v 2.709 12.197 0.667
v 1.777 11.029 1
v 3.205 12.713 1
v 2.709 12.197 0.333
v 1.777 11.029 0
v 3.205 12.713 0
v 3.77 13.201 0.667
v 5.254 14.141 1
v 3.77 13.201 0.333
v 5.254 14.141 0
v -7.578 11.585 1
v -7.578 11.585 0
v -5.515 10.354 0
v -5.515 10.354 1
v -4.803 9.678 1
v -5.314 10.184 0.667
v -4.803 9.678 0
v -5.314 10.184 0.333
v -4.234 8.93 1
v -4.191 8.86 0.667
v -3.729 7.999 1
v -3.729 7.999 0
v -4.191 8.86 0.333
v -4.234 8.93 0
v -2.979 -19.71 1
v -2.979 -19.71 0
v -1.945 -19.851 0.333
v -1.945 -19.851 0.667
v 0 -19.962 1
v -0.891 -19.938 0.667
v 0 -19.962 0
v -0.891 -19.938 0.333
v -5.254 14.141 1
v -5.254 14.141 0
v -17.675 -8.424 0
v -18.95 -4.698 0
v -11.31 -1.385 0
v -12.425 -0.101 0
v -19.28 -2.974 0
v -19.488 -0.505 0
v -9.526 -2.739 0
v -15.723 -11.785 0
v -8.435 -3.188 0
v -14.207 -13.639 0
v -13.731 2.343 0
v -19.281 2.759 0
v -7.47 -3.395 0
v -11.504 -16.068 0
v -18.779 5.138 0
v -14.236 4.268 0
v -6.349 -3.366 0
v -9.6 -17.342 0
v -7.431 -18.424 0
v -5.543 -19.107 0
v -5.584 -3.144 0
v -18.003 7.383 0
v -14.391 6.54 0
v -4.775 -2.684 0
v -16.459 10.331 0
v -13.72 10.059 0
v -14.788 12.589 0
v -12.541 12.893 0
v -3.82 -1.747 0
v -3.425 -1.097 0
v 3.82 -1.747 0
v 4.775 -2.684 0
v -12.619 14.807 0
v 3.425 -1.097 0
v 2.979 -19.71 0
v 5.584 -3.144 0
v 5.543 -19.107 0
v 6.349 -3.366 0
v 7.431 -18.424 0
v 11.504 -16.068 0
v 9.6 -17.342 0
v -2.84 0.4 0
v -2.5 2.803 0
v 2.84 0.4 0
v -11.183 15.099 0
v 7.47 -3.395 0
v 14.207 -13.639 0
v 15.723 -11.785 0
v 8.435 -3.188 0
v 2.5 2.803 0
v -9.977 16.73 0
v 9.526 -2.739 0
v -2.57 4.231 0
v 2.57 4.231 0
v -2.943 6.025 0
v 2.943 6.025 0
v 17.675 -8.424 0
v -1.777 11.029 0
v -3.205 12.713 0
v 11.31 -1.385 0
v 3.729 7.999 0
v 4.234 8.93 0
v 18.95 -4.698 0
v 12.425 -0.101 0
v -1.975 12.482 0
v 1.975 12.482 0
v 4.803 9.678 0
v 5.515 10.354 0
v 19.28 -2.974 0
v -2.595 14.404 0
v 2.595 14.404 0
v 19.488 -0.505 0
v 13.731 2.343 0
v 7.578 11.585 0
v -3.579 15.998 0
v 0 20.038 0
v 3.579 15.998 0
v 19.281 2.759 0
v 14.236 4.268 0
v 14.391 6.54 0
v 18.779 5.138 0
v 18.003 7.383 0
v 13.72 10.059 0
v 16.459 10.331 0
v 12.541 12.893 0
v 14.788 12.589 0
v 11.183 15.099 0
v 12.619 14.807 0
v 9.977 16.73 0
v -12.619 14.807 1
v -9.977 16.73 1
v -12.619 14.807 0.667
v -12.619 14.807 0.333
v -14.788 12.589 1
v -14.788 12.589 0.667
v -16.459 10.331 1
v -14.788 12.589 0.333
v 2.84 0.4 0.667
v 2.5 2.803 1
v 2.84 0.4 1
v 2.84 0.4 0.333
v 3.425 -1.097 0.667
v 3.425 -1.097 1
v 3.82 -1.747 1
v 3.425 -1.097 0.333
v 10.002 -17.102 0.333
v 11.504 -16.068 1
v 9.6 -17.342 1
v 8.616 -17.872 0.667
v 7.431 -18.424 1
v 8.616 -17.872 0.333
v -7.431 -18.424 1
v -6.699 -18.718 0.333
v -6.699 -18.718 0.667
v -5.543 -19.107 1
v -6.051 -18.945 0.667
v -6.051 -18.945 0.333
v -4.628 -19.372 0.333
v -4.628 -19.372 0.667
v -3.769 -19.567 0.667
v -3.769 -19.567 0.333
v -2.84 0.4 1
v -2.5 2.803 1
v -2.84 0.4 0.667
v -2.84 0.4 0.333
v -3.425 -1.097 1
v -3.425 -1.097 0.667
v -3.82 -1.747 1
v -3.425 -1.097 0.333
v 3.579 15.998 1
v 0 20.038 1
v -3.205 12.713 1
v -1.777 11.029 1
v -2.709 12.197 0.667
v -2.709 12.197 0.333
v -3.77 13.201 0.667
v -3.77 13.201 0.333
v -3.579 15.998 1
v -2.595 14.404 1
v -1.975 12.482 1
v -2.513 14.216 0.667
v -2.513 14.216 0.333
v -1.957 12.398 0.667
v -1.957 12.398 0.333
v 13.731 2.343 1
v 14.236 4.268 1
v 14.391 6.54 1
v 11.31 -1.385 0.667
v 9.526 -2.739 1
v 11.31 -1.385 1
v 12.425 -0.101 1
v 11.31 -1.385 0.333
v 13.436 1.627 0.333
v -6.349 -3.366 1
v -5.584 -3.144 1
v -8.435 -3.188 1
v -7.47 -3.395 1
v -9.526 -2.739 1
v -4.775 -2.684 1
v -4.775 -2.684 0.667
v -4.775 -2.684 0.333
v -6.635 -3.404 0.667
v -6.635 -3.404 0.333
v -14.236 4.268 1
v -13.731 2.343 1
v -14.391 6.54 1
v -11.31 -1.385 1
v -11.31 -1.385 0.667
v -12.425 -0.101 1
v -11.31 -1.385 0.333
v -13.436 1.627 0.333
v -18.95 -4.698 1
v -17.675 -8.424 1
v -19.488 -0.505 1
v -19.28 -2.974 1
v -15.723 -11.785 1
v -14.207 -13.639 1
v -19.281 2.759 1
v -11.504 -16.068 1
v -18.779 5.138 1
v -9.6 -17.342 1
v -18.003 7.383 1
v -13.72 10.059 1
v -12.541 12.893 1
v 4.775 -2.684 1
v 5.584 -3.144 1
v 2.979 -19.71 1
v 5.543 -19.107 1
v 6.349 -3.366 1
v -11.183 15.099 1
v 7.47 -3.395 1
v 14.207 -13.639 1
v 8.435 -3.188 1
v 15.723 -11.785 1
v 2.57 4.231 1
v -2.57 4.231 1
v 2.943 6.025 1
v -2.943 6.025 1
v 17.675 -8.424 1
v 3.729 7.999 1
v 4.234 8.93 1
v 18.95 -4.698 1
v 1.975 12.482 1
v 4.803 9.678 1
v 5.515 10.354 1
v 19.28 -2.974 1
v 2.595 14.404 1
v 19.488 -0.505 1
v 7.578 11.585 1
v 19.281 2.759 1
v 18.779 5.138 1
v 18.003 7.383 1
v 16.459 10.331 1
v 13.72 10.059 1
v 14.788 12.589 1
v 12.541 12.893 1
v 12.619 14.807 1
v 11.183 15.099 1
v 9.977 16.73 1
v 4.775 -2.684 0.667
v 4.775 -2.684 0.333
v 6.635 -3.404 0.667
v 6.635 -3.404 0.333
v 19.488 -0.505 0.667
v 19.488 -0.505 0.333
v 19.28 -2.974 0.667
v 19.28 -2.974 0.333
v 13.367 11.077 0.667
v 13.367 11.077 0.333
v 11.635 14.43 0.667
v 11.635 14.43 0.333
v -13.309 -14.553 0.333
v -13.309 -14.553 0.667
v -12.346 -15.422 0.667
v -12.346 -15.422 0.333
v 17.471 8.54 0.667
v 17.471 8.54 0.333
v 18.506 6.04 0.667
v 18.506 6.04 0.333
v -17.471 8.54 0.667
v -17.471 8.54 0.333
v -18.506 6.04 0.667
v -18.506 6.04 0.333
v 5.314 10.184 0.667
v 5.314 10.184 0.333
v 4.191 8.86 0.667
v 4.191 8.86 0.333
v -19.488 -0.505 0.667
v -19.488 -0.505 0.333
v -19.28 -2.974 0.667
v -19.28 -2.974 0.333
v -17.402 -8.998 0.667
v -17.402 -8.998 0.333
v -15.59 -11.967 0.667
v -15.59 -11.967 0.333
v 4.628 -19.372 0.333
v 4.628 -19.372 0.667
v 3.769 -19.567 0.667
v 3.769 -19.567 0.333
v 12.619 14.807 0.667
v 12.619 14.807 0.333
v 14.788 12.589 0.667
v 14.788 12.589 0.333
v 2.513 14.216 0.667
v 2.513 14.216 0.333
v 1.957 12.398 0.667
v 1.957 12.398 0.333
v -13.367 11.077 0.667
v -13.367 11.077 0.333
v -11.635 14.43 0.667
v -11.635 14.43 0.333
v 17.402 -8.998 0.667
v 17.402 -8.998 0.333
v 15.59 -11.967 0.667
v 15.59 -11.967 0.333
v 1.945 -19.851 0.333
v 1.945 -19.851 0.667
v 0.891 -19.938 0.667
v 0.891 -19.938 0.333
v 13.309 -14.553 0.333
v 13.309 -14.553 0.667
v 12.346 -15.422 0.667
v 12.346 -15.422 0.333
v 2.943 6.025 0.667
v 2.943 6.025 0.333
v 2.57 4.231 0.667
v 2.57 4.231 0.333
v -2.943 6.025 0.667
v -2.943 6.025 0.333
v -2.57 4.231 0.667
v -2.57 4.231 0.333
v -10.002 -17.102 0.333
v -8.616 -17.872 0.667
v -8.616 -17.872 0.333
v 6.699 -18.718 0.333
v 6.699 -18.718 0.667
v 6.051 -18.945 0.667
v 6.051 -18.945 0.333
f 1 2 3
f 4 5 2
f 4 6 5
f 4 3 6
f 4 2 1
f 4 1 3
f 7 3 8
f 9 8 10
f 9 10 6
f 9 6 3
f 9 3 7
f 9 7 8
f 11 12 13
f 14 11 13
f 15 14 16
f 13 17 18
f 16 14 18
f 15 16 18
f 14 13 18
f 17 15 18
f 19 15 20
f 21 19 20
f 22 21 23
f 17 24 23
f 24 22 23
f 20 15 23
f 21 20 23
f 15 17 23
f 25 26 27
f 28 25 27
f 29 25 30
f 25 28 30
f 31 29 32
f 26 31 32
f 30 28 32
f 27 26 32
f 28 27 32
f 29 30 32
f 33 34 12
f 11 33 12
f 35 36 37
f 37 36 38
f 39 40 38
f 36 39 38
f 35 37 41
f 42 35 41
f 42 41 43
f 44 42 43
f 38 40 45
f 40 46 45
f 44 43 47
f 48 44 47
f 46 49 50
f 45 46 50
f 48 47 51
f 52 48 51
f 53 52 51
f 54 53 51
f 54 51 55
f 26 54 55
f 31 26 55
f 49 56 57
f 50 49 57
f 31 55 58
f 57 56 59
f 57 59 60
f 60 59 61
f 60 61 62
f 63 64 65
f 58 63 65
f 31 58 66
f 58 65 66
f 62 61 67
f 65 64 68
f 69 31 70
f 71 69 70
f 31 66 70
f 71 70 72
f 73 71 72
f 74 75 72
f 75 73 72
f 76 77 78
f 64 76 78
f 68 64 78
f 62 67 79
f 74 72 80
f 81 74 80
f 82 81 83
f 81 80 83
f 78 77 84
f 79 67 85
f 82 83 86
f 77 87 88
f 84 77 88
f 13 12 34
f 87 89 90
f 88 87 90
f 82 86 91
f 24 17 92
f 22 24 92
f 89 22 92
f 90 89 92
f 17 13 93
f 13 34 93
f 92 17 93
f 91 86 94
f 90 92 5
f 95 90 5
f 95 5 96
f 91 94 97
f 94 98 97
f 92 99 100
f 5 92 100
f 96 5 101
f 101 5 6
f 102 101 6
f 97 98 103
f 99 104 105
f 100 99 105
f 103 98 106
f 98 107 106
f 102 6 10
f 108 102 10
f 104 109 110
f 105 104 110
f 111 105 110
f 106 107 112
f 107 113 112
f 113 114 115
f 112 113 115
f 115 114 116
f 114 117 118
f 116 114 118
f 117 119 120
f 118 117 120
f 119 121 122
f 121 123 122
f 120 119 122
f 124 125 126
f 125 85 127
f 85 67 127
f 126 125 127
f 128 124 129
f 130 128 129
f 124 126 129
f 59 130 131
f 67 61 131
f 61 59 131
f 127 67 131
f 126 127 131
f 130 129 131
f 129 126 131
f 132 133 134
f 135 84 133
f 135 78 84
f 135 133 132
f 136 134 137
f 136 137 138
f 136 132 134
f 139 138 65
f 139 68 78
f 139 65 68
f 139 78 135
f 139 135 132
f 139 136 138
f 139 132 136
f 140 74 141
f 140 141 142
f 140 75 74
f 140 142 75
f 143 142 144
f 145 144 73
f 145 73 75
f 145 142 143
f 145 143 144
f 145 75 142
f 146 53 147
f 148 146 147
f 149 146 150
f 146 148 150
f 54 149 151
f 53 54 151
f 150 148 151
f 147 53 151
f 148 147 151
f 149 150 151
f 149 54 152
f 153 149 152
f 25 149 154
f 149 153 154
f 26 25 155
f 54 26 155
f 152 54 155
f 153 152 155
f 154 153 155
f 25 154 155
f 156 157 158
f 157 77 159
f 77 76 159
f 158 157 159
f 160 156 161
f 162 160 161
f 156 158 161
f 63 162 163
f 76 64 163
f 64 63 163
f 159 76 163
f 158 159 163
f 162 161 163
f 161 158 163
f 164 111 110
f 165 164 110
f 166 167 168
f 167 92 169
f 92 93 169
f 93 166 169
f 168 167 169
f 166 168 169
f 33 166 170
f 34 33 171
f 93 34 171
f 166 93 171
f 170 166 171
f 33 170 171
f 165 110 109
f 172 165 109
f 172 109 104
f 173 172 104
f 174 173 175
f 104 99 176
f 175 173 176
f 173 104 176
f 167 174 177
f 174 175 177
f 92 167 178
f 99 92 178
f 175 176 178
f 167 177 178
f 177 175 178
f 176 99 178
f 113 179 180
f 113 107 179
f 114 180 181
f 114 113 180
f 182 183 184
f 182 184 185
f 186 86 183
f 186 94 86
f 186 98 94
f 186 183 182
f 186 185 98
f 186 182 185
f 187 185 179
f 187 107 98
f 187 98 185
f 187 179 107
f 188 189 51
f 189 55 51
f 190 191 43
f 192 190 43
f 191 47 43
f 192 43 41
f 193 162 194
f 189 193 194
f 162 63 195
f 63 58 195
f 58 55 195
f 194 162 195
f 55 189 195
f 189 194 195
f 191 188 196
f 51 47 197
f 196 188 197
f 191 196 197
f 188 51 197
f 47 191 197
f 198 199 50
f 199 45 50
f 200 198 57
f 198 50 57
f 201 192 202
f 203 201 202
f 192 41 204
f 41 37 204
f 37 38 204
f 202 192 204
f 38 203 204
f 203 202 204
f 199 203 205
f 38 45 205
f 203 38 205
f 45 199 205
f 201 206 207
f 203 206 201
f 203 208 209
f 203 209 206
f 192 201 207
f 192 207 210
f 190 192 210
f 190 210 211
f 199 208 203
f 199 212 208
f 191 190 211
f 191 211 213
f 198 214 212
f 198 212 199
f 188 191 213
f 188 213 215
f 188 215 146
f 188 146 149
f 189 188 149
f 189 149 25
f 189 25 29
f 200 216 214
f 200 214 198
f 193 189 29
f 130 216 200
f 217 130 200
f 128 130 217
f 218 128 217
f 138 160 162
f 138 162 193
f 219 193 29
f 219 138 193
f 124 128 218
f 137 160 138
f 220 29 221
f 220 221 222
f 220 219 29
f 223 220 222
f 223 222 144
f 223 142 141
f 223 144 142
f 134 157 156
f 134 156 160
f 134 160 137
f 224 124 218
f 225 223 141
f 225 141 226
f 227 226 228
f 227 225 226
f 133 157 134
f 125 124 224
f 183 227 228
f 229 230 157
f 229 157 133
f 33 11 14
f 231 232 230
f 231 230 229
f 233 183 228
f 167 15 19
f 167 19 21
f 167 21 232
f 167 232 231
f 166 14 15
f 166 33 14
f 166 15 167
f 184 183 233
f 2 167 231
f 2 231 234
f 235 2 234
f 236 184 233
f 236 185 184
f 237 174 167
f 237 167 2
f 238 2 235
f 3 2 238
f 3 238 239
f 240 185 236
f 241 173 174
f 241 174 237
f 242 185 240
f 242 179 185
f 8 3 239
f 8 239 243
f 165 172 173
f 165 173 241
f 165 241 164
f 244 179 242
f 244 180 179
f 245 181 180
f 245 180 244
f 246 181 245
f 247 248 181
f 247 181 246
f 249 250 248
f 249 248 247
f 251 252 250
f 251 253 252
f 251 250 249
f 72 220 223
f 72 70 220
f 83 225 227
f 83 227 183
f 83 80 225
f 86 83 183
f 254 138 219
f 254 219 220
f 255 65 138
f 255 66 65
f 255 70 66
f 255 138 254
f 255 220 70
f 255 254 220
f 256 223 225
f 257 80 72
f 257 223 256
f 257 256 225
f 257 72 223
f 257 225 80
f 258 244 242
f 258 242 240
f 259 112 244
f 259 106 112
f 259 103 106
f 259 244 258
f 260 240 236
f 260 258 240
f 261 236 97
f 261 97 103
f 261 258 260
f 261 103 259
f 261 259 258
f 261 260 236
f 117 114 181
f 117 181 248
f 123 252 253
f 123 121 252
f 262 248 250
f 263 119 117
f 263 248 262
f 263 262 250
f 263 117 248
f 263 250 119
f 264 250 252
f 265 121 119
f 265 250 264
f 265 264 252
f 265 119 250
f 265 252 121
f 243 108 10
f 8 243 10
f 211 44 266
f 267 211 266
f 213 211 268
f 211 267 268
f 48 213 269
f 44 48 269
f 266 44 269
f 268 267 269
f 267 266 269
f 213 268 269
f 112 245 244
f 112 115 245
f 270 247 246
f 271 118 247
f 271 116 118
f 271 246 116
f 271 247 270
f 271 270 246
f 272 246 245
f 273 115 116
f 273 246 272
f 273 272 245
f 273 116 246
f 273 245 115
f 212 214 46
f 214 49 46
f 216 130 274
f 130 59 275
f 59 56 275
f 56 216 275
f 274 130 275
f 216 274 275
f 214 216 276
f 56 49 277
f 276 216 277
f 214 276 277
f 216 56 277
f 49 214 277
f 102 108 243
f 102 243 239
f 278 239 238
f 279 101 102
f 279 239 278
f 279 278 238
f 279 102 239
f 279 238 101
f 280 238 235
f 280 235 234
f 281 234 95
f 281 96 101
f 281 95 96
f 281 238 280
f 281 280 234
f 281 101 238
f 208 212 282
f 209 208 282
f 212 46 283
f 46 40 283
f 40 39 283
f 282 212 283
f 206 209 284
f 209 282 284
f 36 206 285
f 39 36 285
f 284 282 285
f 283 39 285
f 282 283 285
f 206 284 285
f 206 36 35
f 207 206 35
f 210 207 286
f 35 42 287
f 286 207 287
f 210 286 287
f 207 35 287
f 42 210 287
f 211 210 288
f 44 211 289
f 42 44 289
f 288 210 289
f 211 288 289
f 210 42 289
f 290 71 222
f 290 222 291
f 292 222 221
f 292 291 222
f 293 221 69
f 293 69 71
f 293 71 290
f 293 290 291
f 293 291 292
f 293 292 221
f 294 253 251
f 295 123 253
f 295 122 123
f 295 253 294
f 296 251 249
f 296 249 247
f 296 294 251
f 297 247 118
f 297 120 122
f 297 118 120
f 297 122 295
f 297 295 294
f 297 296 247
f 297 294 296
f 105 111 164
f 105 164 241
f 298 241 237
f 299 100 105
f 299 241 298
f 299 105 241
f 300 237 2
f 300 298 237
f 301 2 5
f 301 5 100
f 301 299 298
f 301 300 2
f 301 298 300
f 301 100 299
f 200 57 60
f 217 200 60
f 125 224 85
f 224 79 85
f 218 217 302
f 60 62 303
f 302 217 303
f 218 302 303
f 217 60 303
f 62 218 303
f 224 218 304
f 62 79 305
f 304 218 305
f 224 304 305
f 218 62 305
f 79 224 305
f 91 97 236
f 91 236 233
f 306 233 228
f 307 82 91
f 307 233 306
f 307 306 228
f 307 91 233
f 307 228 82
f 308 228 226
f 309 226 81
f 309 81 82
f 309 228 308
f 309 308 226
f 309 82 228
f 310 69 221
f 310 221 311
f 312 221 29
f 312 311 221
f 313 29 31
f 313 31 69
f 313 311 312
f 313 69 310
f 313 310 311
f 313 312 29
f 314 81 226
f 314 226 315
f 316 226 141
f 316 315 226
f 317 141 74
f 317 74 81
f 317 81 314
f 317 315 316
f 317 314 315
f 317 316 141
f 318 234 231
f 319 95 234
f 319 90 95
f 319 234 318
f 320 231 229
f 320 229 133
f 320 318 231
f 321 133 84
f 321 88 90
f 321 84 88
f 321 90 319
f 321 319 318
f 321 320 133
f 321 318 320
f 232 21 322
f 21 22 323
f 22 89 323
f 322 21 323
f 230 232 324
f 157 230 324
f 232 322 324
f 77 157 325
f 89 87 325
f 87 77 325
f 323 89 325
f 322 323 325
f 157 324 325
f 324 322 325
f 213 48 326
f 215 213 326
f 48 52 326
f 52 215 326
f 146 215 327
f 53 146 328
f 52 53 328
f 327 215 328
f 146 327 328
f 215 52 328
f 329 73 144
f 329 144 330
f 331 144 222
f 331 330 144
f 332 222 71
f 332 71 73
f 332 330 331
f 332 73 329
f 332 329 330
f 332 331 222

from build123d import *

# Parameters (mm, degrees)
F1_DEPTH = 1


with BuildPart() as f1:
    # F0 (on Top) → F1 (new body)
    with BuildSketch(Plane.XY):
        with BuildLine():
            Line((3.579062, 15.997813), (0, 20.038363))
            Line((0, 20.038363), (-3.579062, 15.997813))
            add(Edge.make_bspline(
                [(-3.579062, 15.997813), (-2.214011, 14.396154), (-1.813596, 12.011866), (-1.777195, 11.029029)],
                knots=[0, 0, 0, 0, 5.285409, 5.285409, 5.285409, 5.285409], degree=3))
            add(Edge.make_bspline(
                [(-1.777195, 11.029029), (-2.742199, 12.312406), (-3.461874, 13.199826), (-5.253524, 14.141345)],
                knots=[0, 0, 0, 0, 4.66598, 4.66598, 4.66598, 4.66598], degree=3))
            Line((-5.253524, 14.141345), (-7.578195, 11.584778))
            add(Edge.make_bspline(
                [(-7.578195, 11.584778), (-4.584184, 10.274329), (-4.019963, 8.499763), (-3.728752, 7.999245)],
                knots=[0, 0, 0, 0, 5.260633, 5.260633, 5.260633, 5.260633], degree=3))
            add(Edge.make_bspline(
                [(-3.728752, 7.999245), (-2.700414, 5.997171), (-2.454705, 3.985996), (-2.500207, 2.802952)],
                knots=[0, 0, 0, 0, 5.339549, 5.339549, 5.339549, 5.339549], degree=3))
            add(Edge.make_bspline(
                [(-2.500207, 2.802952), (-2.573009, -0.072755), (-3.66505, -1.501508), (-3.819756, -1.747217)],
                knots=[0, 0, 0, 0, 4.737642, 4.737642, 4.737642, 4.737642], degree=3))
            add(Edge.make_bspline(
                [(-3.819756, -1.747217), (-4.365776, -2.402442), (-6.076639, -4.486419), (-9.525668, -2.739154)],
                knots=[0, 0, 0, 0, 5.791491, 5.791491, 5.791491, 5.791491], degree=3))
            add(Edge.make_bspline(
                [(-9.525668, -2.739154), (-10.633131, -2.132458), (-14.527799, 0.595101), (-14.390765, 6.540306)],
                knots=[0, 0, 0, 0, 10.477479, 10.477479, 10.477479, 10.477479], degree=3))
            add(Edge.make_bspline(
                [(-14.390765, 6.540306), (-13.981922, 11.711812), (-11.33765, 14.913963), (-9.977424, 16.72974)],
                knots=[0, 0, 0, 0, 11.104149, 11.104149, 11.104149, 11.104149], degree=3))
            add(Edge.make_bspline(
                [(-9.977424, 16.72974), (-12.846339, 15.039146), (-15.045267, 12.524201), (-16.459247, 10.330621)],
                knots=[0, 0, 0, 0, 9.10839, 9.10839, 9.10839, 9.10839], degree=3))
            add(Edge.make_bspline(
                [(-16.459247, 10.330621), (-17.365262, 8.871559), (-18.730281, 6.45445), (-19.280606, 2.758645)],
                knots=[0, 0, 0, 0, 8.080525, 8.080525, 8.080525, 8.080525], degree=3))
            add(Edge.make_bspline(
                [(-19.280606, 2.758645), (-19.793346, -0.917996), (-19.243021, -3.329711), (-18.94978, -4.69844)],
                knots=[0, 0, 0, 0, 7.46442, 7.46442, 7.46442, 7.46442], degree=3))
            add(Edge.make_bspline(
                [(-18.94978, -4.69844), (-17.765756, -9.674388), (-15.143621, -12.604054), (-14.20664, -13.638732)],
                knots=[0, 0, 0, 0, 10.120583, 10.120583, 10.120583, 10.120583], degree=3))
            add(Edge.make_bspline(
                [(-14.20664, -13.638732), (-13.403441, -14.51529), (-12.222866, -15.593206), (-11.504254, -16.068003)],
                knots=[0, 0, 0, 0, 3.633765, 3.633765, 3.633765, 3.633765], degree=3))
            add(Edge.make_bspline(
                [(-11.504254, -16.068003), (-9.972031, -17.249116), (-8.487965, -17.96635), (-7.431189, -18.424159)],
                knots=[0, 0, 0, 0, 4.705457, 4.705457, 4.705457, 4.705457], degree=3))
            add(Edge.make_bspline(
                [(-7.431189, -18.424159), (-6.675803, -18.752256), (-5.962383, -18.977345), (-5.542725, -19.107058)],
                knots=[0, 0, 0, 0, 2.008145, 2.008145, 2.008145, 2.008145], degree=3))
            add(Edge.make_bspline(
                [(-5.542725, -19.107058), (-4.604215, -19.412267), (-3.730562, -19.587761), (-2.978992, -19.709844)],
                knots=[0, 0, 0, 0, 2.633643, 2.633643, 2.633643, 2.633643], degree=3))
            add(Edge.make_bspline(
                [(-2.978992, -19.709844), (-2.017592, -19.87389), (-0.747171, -19.973081), (0, -19.961637)],
                knots=[0, 0, 0, 0, 2.989614, 2.989614, 2.989614, 2.989614], degree=3))
            add(Edge.make_bspline(
                [(2.978992, -19.709844), (2.017592, -19.87389), (0.747171, -19.973081), (0, -19.961637)],
                knots=[0, 0, 0, 0, 2.989614, 2.989614, 2.989614, 2.989614], degree=3))
            add(Edge.make_bspline(
                [(5.542725, -19.107058), (4.604215, -19.412267), (3.730562, -19.587761), (2.978992, -19.709844)],
                knots=[0, 0, 0, 0, 2.633643, 2.633643, 2.633643, 2.633643], degree=3))
            add(Edge.make_bspline(
                [(7.431189, -18.424159), (6.675803, -18.752256), (5.962383, -18.977345), (5.542725, -19.107058)],
                knots=[0, 0, 0, 0, 2.008145, 2.008145, 2.008145, 2.008145], degree=3))
            add(Edge.make_bspline(
                [(11.504254, -16.068003), (9.972031, -17.249116), (8.487965, -17.96635), (7.431189, -18.424159)],
                knots=[0, 0, 0, 0, 4.705457, 4.705457, 4.705457, 4.705457], degree=3))
            add(Edge.make_bspline(
                [(14.20664, -13.638732), (13.403441, -14.51529), (12.222866, -15.593206), (11.504254, -16.068003)],
                knots=[0, 0, 0, 0, 3.633765, 3.633765, 3.633765, 3.633765], degree=3))
            add(Edge.make_bspline(
                [(18.94978, -4.69844), (17.765756, -9.674388), (15.143621, -12.604054), (14.20664, -13.638732)],
                knots=[0, 0, 0, 0, 10.120583, 10.120583, 10.120583, 10.120583], degree=3))
            add(Edge.make_bspline(
                [(19.280606, 2.758645), (19.793346, -0.917996), (19.243021, -3.329711), (18.94978, -4.69844)],
                knots=[0, 0, 0, 0, 7.46442, 7.46442, 7.46442, 7.46442], degree=3))
            add(Edge.make_bspline(
                [(16.459247, 10.330621), (17.365262, 8.871559), (18.730281, 6.45445), (19.280606, 2.758645)],
                knots=[0, 0, 0, 0, 8.080525, 8.080525, 8.080525, 8.080525], degree=3))
            add(Edge.make_bspline(
                [(9.977424, 16.72974), (12.846339, 15.039146), (15.045267, 12.524201), (16.459247, 10.330621)],
                knots=[0, 0, 0, 0, 9.10839, 9.10839, 9.10839, 9.10839], degree=3))
            add(Edge.make_bspline(
                [(14.390765, 6.540306), (13.981922, 11.711812), (11.33765, 14.913963), (9.977424, 16.72974)],
                knots=[0, 0, 0, 0, 11.104149, 11.104149, 11.104149, 11.104149], degree=3))
            add(Edge.make_bspline(
                [(9.525668, -2.739154), (10.633131, -2.132458), (14.527799, 0.595101), (14.390765, 6.540306)],
                knots=[0, 0, 0, 0, 10.477479, 10.477479, 10.477479, 10.477479], degree=3))
            add(Edge.make_bspline(
                [(3.819756, -1.747217), (4.365776, -2.402442), (6.076639, -4.486419), (9.525668, -2.739154)],
                knots=[0, 0, 0, 0, 5.791491, 5.791491, 5.791491, 5.791491], degree=3))
            add(Edge.make_bspline(
                [(2.500207, 2.802952), (2.573009, -0.072755), (3.66505, -1.501508), (3.819756, -1.747217)],
                knots=[0, 0, 0, 0, 4.737642, 4.737642, 4.737642, 4.737642], degree=3))
            add(Edge.make_bspline(
                [(3.728752, 7.999245), (2.700414, 5.997171), (2.454705, 3.985996), (2.500207, 2.802952)],
                knots=[0, 0, 0, 0, 5.339549, 5.339549, 5.339549, 5.339549], degree=3))
            add(Edge.make_bspline(
                [(7.578195, 11.584778), (4.584184, 10.274329), (4.019963, 8.499763), (3.728752, 7.999245)],
                knots=[0, 0, 0, 0, 5.260633, 5.260633, 5.260633, 5.260633], degree=3))
            Line((7.578195, 11.584778), (5.253524, 14.141345))
            add(Edge.make_bspline(
                [(1.777195, 11.029029), (2.742199, 12.312406), (3.461874, 13.199826), (5.253524, 14.141345)],
                knots=[0, 0, 0, 0, 4.66598, 4.66598, 4.66598, 4.66598], degree=3))
            add(Edge.make_bspline(
                [(3.579062, 15.997813), (2.214011, 14.396154), (1.813596, 12.011866), (1.777195, 11.029029)],
                knots=[0, 0, 0, 0, 5.285409, 5.285409, 5.285409, 5.285409], degree=3))
        make_face()
    extrude(amount=F1_DEPTH)


solid = f1.part
